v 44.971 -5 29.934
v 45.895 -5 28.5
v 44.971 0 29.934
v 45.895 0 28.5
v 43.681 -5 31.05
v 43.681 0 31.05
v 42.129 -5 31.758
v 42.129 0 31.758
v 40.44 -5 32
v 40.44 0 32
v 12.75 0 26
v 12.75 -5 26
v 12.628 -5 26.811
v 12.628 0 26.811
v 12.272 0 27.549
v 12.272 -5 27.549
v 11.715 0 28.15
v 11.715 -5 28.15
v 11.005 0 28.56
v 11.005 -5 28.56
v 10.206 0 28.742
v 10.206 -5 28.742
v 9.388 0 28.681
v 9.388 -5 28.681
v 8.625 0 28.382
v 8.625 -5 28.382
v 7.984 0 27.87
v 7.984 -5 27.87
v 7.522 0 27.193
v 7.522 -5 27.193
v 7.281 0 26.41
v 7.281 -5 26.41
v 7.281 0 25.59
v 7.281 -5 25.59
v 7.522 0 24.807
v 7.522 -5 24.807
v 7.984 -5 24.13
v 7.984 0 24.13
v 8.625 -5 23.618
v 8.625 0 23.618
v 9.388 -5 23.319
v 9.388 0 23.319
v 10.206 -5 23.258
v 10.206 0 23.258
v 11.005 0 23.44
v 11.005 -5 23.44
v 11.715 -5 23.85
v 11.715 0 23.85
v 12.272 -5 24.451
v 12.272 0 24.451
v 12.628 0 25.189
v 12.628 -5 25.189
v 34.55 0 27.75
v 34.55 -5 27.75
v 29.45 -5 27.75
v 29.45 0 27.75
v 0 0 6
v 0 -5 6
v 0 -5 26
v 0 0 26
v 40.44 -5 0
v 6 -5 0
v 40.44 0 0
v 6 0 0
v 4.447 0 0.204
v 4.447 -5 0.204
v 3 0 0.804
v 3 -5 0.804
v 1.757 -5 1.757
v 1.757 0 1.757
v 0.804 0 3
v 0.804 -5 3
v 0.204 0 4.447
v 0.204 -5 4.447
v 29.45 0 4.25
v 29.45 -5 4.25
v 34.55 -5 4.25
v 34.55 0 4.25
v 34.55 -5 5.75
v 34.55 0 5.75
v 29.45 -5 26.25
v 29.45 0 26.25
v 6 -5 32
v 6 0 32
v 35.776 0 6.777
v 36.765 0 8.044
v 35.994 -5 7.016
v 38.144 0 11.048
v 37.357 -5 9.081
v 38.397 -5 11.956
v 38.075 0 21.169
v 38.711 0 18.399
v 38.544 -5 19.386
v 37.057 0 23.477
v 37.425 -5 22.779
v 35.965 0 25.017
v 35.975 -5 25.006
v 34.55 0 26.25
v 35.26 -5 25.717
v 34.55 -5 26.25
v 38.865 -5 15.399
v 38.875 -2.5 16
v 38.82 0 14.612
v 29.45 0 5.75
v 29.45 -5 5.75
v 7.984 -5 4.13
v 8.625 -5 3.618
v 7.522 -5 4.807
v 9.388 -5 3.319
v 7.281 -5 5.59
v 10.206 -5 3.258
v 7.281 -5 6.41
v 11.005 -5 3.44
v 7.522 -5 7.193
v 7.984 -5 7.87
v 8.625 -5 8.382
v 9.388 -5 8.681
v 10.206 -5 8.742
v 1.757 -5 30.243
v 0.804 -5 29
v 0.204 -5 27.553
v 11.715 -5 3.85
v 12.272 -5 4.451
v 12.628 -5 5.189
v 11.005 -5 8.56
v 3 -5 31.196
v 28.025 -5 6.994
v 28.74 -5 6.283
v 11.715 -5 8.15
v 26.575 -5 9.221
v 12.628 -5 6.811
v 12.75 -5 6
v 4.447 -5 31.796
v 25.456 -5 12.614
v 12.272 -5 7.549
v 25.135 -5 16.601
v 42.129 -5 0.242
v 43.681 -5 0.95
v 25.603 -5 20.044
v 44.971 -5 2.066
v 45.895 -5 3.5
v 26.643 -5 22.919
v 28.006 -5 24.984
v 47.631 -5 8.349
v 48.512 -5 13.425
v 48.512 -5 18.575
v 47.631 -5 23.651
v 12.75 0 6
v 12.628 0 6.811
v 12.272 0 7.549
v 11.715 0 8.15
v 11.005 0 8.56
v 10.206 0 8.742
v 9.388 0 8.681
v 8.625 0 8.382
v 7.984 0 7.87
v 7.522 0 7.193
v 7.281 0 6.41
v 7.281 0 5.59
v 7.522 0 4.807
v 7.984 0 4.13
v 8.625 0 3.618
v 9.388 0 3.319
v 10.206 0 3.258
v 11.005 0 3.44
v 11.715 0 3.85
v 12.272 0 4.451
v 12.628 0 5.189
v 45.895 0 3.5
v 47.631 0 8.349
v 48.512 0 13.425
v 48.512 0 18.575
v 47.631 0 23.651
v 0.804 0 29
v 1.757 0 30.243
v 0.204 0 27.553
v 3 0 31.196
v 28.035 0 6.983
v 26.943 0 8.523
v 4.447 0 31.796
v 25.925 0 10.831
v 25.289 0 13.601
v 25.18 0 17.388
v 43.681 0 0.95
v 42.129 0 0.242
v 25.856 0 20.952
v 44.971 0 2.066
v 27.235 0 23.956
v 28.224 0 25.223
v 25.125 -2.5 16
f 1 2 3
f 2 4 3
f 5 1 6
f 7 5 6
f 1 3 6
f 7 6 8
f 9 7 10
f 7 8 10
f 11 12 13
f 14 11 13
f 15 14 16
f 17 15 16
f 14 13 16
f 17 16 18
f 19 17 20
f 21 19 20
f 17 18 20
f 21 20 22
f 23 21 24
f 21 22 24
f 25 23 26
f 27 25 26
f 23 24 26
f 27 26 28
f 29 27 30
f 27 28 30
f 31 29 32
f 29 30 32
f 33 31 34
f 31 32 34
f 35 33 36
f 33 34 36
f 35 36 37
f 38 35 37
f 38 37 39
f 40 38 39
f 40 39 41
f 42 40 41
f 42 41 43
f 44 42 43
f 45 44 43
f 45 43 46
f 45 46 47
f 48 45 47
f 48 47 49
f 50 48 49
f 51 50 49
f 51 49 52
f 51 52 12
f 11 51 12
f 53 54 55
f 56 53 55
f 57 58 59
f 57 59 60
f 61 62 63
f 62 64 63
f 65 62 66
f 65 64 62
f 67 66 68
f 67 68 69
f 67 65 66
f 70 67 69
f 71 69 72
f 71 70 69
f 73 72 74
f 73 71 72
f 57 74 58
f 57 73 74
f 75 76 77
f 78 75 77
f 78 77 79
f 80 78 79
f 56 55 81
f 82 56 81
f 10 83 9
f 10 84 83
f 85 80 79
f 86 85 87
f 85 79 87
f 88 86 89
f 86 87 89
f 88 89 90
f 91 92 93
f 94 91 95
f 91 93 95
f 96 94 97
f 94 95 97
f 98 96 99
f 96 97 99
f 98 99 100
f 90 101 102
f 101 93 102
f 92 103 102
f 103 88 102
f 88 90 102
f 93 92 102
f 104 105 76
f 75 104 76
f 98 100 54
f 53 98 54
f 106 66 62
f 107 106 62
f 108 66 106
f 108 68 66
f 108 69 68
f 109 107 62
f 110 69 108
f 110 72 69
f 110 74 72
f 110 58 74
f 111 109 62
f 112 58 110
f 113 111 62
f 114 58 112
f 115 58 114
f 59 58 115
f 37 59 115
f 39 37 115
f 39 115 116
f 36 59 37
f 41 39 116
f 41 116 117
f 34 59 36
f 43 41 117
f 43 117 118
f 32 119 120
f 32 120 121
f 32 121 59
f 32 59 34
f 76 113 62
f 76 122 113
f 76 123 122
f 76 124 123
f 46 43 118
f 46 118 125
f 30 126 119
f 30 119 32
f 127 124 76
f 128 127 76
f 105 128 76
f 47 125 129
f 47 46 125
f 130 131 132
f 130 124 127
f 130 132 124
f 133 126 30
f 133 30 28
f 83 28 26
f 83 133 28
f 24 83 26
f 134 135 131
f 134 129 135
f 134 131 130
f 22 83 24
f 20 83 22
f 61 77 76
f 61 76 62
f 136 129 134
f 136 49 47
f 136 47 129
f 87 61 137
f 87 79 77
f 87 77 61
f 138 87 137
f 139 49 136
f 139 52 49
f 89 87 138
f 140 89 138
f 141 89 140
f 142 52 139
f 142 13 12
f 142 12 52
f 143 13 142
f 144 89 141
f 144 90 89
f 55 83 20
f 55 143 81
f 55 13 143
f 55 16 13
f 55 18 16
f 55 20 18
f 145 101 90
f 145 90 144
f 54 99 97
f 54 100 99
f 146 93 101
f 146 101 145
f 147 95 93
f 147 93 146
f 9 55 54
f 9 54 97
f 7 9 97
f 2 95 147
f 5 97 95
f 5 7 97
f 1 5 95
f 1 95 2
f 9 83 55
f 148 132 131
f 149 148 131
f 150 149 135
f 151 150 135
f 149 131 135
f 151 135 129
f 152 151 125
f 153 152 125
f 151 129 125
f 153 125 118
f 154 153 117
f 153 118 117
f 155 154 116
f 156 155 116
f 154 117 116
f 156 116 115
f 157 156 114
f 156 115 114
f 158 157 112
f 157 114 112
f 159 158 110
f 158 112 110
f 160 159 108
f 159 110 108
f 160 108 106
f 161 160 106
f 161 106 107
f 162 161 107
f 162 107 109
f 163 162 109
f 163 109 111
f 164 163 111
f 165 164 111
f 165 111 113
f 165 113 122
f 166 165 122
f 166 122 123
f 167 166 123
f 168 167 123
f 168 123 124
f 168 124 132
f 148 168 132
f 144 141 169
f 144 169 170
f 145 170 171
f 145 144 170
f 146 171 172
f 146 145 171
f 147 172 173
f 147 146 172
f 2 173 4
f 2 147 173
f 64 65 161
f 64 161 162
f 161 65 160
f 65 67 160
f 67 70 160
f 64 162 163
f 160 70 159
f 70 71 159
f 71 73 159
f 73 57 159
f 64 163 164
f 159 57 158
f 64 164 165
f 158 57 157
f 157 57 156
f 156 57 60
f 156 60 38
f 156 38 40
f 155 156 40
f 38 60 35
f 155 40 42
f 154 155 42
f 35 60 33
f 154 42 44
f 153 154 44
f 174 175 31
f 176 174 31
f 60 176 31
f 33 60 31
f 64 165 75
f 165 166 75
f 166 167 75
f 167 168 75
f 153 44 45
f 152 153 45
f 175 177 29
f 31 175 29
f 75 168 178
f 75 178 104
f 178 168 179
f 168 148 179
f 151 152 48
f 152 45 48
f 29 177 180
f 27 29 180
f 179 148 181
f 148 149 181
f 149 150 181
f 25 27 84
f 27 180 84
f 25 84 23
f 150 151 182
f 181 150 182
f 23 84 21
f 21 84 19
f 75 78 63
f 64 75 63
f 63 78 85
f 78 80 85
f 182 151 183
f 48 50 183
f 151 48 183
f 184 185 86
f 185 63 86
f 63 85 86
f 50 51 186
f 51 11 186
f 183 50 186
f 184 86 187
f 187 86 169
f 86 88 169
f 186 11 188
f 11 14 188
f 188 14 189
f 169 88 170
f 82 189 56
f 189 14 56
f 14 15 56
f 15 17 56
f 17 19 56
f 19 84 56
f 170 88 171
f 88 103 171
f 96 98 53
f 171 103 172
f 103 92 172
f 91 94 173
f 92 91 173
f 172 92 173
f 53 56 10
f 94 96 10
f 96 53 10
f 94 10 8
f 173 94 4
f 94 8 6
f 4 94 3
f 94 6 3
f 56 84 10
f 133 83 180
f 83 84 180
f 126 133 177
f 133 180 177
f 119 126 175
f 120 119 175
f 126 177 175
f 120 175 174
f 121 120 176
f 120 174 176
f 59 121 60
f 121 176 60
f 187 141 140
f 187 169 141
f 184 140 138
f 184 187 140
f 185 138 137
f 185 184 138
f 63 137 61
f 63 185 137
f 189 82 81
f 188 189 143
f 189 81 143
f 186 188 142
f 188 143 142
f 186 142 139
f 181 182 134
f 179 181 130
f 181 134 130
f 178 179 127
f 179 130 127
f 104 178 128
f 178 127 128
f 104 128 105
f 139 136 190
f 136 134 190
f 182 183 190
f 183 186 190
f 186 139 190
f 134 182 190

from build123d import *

# Parameters (mm, degrees)
SKETCH1_W           = 44
SKETCH1_H           = 5
BOSS_EXTRUDE1_DEPTH = 32
SKETCH2_R           = 2.75
CUT_EXTRUDE1_DEPTH  = 6
BOSS_EXTRUDE2_DEPTH = 5
FILLET1_R           = 6


with BuildPart() as part:
    # Sketch1 → Boss-Extrude1 (new body)
    with BuildSketch(Plane.XY):
        with Locations((22, -2.5)):
            Rectangle(SKETCH1_W, SKETCH1_H)
    extrude(amount=BOSS_EXTRUDE1_DEPTH)

    # Sketch2 → Cut-Extrude1 (cut, through all)
    with BuildSketch(Plane.XZ.offset(5)):
        with Locations((10, 26)):
            Circle(SKETCH2_R)
        with Locations((10, 6)):
            Circle(SKETCH2_R)
        with BuildLine():
            Line((29.45, 5.75), (29.45, 4.25))
            Line((29.45, 4.25), (34.55, 4.25))
            Line((34.55, 4.25), (34.55, 5.75))
            add(Edge.make_bspline(
                [(34.55, 5.75), (50.535539216, 16), (34.55, 26.25)],
                knots=[3.521580401, 3.521580401, 3.521580401, 5.90319756, 5.90319756, 5.90319756], degree=2, weights=[1, 0.370909091, 1]))
            Line((34.55, 26.25), (34.55, 27.75))
            Line((34.55, 27.75), (29.45, 27.75))
            Line((29.45, 27.75), (29.45, 26.25))
            add(Edge.make_bspline(
                [(29.45, 26.25), (13.464460784, 16), (29.45, 5.75)],
                knots=[0.379987747, 0.379987747, 0.379987747, 2.761604906, 2.761604906, 2.761604906], degree=2, weights=[1, 0.370909091, 1]))
        make_face()
    extrude(amount=-CUT_EXTRUDE1_DEPTH, mode=Mode.SUBTRACT)

    # Sketch3 → Boss-Extrude2 (add)
    with BuildSketch(Plane.XZ.offset(5)):
        with BuildLine():
            Line((44, 32), (44, 0))
            ThreePointArc((44, 0), (48.622844919, 16), (44, 32))
        make_face()
    extrude(amount=-BOSS_EXTRUDE2_DEPTH)

    # Fillet1
    fillet1_edges = [part.edges().sort_by_distance(p)[0] for p in [
        (0, -2.5, 32),
        (44, -2.5, 32),
        (0, -2.5, 0),
        (44, -2.5, 0),
    ]]
    fillet(fillet1_edges, radius=FILLET1_R)


solid = part.part
